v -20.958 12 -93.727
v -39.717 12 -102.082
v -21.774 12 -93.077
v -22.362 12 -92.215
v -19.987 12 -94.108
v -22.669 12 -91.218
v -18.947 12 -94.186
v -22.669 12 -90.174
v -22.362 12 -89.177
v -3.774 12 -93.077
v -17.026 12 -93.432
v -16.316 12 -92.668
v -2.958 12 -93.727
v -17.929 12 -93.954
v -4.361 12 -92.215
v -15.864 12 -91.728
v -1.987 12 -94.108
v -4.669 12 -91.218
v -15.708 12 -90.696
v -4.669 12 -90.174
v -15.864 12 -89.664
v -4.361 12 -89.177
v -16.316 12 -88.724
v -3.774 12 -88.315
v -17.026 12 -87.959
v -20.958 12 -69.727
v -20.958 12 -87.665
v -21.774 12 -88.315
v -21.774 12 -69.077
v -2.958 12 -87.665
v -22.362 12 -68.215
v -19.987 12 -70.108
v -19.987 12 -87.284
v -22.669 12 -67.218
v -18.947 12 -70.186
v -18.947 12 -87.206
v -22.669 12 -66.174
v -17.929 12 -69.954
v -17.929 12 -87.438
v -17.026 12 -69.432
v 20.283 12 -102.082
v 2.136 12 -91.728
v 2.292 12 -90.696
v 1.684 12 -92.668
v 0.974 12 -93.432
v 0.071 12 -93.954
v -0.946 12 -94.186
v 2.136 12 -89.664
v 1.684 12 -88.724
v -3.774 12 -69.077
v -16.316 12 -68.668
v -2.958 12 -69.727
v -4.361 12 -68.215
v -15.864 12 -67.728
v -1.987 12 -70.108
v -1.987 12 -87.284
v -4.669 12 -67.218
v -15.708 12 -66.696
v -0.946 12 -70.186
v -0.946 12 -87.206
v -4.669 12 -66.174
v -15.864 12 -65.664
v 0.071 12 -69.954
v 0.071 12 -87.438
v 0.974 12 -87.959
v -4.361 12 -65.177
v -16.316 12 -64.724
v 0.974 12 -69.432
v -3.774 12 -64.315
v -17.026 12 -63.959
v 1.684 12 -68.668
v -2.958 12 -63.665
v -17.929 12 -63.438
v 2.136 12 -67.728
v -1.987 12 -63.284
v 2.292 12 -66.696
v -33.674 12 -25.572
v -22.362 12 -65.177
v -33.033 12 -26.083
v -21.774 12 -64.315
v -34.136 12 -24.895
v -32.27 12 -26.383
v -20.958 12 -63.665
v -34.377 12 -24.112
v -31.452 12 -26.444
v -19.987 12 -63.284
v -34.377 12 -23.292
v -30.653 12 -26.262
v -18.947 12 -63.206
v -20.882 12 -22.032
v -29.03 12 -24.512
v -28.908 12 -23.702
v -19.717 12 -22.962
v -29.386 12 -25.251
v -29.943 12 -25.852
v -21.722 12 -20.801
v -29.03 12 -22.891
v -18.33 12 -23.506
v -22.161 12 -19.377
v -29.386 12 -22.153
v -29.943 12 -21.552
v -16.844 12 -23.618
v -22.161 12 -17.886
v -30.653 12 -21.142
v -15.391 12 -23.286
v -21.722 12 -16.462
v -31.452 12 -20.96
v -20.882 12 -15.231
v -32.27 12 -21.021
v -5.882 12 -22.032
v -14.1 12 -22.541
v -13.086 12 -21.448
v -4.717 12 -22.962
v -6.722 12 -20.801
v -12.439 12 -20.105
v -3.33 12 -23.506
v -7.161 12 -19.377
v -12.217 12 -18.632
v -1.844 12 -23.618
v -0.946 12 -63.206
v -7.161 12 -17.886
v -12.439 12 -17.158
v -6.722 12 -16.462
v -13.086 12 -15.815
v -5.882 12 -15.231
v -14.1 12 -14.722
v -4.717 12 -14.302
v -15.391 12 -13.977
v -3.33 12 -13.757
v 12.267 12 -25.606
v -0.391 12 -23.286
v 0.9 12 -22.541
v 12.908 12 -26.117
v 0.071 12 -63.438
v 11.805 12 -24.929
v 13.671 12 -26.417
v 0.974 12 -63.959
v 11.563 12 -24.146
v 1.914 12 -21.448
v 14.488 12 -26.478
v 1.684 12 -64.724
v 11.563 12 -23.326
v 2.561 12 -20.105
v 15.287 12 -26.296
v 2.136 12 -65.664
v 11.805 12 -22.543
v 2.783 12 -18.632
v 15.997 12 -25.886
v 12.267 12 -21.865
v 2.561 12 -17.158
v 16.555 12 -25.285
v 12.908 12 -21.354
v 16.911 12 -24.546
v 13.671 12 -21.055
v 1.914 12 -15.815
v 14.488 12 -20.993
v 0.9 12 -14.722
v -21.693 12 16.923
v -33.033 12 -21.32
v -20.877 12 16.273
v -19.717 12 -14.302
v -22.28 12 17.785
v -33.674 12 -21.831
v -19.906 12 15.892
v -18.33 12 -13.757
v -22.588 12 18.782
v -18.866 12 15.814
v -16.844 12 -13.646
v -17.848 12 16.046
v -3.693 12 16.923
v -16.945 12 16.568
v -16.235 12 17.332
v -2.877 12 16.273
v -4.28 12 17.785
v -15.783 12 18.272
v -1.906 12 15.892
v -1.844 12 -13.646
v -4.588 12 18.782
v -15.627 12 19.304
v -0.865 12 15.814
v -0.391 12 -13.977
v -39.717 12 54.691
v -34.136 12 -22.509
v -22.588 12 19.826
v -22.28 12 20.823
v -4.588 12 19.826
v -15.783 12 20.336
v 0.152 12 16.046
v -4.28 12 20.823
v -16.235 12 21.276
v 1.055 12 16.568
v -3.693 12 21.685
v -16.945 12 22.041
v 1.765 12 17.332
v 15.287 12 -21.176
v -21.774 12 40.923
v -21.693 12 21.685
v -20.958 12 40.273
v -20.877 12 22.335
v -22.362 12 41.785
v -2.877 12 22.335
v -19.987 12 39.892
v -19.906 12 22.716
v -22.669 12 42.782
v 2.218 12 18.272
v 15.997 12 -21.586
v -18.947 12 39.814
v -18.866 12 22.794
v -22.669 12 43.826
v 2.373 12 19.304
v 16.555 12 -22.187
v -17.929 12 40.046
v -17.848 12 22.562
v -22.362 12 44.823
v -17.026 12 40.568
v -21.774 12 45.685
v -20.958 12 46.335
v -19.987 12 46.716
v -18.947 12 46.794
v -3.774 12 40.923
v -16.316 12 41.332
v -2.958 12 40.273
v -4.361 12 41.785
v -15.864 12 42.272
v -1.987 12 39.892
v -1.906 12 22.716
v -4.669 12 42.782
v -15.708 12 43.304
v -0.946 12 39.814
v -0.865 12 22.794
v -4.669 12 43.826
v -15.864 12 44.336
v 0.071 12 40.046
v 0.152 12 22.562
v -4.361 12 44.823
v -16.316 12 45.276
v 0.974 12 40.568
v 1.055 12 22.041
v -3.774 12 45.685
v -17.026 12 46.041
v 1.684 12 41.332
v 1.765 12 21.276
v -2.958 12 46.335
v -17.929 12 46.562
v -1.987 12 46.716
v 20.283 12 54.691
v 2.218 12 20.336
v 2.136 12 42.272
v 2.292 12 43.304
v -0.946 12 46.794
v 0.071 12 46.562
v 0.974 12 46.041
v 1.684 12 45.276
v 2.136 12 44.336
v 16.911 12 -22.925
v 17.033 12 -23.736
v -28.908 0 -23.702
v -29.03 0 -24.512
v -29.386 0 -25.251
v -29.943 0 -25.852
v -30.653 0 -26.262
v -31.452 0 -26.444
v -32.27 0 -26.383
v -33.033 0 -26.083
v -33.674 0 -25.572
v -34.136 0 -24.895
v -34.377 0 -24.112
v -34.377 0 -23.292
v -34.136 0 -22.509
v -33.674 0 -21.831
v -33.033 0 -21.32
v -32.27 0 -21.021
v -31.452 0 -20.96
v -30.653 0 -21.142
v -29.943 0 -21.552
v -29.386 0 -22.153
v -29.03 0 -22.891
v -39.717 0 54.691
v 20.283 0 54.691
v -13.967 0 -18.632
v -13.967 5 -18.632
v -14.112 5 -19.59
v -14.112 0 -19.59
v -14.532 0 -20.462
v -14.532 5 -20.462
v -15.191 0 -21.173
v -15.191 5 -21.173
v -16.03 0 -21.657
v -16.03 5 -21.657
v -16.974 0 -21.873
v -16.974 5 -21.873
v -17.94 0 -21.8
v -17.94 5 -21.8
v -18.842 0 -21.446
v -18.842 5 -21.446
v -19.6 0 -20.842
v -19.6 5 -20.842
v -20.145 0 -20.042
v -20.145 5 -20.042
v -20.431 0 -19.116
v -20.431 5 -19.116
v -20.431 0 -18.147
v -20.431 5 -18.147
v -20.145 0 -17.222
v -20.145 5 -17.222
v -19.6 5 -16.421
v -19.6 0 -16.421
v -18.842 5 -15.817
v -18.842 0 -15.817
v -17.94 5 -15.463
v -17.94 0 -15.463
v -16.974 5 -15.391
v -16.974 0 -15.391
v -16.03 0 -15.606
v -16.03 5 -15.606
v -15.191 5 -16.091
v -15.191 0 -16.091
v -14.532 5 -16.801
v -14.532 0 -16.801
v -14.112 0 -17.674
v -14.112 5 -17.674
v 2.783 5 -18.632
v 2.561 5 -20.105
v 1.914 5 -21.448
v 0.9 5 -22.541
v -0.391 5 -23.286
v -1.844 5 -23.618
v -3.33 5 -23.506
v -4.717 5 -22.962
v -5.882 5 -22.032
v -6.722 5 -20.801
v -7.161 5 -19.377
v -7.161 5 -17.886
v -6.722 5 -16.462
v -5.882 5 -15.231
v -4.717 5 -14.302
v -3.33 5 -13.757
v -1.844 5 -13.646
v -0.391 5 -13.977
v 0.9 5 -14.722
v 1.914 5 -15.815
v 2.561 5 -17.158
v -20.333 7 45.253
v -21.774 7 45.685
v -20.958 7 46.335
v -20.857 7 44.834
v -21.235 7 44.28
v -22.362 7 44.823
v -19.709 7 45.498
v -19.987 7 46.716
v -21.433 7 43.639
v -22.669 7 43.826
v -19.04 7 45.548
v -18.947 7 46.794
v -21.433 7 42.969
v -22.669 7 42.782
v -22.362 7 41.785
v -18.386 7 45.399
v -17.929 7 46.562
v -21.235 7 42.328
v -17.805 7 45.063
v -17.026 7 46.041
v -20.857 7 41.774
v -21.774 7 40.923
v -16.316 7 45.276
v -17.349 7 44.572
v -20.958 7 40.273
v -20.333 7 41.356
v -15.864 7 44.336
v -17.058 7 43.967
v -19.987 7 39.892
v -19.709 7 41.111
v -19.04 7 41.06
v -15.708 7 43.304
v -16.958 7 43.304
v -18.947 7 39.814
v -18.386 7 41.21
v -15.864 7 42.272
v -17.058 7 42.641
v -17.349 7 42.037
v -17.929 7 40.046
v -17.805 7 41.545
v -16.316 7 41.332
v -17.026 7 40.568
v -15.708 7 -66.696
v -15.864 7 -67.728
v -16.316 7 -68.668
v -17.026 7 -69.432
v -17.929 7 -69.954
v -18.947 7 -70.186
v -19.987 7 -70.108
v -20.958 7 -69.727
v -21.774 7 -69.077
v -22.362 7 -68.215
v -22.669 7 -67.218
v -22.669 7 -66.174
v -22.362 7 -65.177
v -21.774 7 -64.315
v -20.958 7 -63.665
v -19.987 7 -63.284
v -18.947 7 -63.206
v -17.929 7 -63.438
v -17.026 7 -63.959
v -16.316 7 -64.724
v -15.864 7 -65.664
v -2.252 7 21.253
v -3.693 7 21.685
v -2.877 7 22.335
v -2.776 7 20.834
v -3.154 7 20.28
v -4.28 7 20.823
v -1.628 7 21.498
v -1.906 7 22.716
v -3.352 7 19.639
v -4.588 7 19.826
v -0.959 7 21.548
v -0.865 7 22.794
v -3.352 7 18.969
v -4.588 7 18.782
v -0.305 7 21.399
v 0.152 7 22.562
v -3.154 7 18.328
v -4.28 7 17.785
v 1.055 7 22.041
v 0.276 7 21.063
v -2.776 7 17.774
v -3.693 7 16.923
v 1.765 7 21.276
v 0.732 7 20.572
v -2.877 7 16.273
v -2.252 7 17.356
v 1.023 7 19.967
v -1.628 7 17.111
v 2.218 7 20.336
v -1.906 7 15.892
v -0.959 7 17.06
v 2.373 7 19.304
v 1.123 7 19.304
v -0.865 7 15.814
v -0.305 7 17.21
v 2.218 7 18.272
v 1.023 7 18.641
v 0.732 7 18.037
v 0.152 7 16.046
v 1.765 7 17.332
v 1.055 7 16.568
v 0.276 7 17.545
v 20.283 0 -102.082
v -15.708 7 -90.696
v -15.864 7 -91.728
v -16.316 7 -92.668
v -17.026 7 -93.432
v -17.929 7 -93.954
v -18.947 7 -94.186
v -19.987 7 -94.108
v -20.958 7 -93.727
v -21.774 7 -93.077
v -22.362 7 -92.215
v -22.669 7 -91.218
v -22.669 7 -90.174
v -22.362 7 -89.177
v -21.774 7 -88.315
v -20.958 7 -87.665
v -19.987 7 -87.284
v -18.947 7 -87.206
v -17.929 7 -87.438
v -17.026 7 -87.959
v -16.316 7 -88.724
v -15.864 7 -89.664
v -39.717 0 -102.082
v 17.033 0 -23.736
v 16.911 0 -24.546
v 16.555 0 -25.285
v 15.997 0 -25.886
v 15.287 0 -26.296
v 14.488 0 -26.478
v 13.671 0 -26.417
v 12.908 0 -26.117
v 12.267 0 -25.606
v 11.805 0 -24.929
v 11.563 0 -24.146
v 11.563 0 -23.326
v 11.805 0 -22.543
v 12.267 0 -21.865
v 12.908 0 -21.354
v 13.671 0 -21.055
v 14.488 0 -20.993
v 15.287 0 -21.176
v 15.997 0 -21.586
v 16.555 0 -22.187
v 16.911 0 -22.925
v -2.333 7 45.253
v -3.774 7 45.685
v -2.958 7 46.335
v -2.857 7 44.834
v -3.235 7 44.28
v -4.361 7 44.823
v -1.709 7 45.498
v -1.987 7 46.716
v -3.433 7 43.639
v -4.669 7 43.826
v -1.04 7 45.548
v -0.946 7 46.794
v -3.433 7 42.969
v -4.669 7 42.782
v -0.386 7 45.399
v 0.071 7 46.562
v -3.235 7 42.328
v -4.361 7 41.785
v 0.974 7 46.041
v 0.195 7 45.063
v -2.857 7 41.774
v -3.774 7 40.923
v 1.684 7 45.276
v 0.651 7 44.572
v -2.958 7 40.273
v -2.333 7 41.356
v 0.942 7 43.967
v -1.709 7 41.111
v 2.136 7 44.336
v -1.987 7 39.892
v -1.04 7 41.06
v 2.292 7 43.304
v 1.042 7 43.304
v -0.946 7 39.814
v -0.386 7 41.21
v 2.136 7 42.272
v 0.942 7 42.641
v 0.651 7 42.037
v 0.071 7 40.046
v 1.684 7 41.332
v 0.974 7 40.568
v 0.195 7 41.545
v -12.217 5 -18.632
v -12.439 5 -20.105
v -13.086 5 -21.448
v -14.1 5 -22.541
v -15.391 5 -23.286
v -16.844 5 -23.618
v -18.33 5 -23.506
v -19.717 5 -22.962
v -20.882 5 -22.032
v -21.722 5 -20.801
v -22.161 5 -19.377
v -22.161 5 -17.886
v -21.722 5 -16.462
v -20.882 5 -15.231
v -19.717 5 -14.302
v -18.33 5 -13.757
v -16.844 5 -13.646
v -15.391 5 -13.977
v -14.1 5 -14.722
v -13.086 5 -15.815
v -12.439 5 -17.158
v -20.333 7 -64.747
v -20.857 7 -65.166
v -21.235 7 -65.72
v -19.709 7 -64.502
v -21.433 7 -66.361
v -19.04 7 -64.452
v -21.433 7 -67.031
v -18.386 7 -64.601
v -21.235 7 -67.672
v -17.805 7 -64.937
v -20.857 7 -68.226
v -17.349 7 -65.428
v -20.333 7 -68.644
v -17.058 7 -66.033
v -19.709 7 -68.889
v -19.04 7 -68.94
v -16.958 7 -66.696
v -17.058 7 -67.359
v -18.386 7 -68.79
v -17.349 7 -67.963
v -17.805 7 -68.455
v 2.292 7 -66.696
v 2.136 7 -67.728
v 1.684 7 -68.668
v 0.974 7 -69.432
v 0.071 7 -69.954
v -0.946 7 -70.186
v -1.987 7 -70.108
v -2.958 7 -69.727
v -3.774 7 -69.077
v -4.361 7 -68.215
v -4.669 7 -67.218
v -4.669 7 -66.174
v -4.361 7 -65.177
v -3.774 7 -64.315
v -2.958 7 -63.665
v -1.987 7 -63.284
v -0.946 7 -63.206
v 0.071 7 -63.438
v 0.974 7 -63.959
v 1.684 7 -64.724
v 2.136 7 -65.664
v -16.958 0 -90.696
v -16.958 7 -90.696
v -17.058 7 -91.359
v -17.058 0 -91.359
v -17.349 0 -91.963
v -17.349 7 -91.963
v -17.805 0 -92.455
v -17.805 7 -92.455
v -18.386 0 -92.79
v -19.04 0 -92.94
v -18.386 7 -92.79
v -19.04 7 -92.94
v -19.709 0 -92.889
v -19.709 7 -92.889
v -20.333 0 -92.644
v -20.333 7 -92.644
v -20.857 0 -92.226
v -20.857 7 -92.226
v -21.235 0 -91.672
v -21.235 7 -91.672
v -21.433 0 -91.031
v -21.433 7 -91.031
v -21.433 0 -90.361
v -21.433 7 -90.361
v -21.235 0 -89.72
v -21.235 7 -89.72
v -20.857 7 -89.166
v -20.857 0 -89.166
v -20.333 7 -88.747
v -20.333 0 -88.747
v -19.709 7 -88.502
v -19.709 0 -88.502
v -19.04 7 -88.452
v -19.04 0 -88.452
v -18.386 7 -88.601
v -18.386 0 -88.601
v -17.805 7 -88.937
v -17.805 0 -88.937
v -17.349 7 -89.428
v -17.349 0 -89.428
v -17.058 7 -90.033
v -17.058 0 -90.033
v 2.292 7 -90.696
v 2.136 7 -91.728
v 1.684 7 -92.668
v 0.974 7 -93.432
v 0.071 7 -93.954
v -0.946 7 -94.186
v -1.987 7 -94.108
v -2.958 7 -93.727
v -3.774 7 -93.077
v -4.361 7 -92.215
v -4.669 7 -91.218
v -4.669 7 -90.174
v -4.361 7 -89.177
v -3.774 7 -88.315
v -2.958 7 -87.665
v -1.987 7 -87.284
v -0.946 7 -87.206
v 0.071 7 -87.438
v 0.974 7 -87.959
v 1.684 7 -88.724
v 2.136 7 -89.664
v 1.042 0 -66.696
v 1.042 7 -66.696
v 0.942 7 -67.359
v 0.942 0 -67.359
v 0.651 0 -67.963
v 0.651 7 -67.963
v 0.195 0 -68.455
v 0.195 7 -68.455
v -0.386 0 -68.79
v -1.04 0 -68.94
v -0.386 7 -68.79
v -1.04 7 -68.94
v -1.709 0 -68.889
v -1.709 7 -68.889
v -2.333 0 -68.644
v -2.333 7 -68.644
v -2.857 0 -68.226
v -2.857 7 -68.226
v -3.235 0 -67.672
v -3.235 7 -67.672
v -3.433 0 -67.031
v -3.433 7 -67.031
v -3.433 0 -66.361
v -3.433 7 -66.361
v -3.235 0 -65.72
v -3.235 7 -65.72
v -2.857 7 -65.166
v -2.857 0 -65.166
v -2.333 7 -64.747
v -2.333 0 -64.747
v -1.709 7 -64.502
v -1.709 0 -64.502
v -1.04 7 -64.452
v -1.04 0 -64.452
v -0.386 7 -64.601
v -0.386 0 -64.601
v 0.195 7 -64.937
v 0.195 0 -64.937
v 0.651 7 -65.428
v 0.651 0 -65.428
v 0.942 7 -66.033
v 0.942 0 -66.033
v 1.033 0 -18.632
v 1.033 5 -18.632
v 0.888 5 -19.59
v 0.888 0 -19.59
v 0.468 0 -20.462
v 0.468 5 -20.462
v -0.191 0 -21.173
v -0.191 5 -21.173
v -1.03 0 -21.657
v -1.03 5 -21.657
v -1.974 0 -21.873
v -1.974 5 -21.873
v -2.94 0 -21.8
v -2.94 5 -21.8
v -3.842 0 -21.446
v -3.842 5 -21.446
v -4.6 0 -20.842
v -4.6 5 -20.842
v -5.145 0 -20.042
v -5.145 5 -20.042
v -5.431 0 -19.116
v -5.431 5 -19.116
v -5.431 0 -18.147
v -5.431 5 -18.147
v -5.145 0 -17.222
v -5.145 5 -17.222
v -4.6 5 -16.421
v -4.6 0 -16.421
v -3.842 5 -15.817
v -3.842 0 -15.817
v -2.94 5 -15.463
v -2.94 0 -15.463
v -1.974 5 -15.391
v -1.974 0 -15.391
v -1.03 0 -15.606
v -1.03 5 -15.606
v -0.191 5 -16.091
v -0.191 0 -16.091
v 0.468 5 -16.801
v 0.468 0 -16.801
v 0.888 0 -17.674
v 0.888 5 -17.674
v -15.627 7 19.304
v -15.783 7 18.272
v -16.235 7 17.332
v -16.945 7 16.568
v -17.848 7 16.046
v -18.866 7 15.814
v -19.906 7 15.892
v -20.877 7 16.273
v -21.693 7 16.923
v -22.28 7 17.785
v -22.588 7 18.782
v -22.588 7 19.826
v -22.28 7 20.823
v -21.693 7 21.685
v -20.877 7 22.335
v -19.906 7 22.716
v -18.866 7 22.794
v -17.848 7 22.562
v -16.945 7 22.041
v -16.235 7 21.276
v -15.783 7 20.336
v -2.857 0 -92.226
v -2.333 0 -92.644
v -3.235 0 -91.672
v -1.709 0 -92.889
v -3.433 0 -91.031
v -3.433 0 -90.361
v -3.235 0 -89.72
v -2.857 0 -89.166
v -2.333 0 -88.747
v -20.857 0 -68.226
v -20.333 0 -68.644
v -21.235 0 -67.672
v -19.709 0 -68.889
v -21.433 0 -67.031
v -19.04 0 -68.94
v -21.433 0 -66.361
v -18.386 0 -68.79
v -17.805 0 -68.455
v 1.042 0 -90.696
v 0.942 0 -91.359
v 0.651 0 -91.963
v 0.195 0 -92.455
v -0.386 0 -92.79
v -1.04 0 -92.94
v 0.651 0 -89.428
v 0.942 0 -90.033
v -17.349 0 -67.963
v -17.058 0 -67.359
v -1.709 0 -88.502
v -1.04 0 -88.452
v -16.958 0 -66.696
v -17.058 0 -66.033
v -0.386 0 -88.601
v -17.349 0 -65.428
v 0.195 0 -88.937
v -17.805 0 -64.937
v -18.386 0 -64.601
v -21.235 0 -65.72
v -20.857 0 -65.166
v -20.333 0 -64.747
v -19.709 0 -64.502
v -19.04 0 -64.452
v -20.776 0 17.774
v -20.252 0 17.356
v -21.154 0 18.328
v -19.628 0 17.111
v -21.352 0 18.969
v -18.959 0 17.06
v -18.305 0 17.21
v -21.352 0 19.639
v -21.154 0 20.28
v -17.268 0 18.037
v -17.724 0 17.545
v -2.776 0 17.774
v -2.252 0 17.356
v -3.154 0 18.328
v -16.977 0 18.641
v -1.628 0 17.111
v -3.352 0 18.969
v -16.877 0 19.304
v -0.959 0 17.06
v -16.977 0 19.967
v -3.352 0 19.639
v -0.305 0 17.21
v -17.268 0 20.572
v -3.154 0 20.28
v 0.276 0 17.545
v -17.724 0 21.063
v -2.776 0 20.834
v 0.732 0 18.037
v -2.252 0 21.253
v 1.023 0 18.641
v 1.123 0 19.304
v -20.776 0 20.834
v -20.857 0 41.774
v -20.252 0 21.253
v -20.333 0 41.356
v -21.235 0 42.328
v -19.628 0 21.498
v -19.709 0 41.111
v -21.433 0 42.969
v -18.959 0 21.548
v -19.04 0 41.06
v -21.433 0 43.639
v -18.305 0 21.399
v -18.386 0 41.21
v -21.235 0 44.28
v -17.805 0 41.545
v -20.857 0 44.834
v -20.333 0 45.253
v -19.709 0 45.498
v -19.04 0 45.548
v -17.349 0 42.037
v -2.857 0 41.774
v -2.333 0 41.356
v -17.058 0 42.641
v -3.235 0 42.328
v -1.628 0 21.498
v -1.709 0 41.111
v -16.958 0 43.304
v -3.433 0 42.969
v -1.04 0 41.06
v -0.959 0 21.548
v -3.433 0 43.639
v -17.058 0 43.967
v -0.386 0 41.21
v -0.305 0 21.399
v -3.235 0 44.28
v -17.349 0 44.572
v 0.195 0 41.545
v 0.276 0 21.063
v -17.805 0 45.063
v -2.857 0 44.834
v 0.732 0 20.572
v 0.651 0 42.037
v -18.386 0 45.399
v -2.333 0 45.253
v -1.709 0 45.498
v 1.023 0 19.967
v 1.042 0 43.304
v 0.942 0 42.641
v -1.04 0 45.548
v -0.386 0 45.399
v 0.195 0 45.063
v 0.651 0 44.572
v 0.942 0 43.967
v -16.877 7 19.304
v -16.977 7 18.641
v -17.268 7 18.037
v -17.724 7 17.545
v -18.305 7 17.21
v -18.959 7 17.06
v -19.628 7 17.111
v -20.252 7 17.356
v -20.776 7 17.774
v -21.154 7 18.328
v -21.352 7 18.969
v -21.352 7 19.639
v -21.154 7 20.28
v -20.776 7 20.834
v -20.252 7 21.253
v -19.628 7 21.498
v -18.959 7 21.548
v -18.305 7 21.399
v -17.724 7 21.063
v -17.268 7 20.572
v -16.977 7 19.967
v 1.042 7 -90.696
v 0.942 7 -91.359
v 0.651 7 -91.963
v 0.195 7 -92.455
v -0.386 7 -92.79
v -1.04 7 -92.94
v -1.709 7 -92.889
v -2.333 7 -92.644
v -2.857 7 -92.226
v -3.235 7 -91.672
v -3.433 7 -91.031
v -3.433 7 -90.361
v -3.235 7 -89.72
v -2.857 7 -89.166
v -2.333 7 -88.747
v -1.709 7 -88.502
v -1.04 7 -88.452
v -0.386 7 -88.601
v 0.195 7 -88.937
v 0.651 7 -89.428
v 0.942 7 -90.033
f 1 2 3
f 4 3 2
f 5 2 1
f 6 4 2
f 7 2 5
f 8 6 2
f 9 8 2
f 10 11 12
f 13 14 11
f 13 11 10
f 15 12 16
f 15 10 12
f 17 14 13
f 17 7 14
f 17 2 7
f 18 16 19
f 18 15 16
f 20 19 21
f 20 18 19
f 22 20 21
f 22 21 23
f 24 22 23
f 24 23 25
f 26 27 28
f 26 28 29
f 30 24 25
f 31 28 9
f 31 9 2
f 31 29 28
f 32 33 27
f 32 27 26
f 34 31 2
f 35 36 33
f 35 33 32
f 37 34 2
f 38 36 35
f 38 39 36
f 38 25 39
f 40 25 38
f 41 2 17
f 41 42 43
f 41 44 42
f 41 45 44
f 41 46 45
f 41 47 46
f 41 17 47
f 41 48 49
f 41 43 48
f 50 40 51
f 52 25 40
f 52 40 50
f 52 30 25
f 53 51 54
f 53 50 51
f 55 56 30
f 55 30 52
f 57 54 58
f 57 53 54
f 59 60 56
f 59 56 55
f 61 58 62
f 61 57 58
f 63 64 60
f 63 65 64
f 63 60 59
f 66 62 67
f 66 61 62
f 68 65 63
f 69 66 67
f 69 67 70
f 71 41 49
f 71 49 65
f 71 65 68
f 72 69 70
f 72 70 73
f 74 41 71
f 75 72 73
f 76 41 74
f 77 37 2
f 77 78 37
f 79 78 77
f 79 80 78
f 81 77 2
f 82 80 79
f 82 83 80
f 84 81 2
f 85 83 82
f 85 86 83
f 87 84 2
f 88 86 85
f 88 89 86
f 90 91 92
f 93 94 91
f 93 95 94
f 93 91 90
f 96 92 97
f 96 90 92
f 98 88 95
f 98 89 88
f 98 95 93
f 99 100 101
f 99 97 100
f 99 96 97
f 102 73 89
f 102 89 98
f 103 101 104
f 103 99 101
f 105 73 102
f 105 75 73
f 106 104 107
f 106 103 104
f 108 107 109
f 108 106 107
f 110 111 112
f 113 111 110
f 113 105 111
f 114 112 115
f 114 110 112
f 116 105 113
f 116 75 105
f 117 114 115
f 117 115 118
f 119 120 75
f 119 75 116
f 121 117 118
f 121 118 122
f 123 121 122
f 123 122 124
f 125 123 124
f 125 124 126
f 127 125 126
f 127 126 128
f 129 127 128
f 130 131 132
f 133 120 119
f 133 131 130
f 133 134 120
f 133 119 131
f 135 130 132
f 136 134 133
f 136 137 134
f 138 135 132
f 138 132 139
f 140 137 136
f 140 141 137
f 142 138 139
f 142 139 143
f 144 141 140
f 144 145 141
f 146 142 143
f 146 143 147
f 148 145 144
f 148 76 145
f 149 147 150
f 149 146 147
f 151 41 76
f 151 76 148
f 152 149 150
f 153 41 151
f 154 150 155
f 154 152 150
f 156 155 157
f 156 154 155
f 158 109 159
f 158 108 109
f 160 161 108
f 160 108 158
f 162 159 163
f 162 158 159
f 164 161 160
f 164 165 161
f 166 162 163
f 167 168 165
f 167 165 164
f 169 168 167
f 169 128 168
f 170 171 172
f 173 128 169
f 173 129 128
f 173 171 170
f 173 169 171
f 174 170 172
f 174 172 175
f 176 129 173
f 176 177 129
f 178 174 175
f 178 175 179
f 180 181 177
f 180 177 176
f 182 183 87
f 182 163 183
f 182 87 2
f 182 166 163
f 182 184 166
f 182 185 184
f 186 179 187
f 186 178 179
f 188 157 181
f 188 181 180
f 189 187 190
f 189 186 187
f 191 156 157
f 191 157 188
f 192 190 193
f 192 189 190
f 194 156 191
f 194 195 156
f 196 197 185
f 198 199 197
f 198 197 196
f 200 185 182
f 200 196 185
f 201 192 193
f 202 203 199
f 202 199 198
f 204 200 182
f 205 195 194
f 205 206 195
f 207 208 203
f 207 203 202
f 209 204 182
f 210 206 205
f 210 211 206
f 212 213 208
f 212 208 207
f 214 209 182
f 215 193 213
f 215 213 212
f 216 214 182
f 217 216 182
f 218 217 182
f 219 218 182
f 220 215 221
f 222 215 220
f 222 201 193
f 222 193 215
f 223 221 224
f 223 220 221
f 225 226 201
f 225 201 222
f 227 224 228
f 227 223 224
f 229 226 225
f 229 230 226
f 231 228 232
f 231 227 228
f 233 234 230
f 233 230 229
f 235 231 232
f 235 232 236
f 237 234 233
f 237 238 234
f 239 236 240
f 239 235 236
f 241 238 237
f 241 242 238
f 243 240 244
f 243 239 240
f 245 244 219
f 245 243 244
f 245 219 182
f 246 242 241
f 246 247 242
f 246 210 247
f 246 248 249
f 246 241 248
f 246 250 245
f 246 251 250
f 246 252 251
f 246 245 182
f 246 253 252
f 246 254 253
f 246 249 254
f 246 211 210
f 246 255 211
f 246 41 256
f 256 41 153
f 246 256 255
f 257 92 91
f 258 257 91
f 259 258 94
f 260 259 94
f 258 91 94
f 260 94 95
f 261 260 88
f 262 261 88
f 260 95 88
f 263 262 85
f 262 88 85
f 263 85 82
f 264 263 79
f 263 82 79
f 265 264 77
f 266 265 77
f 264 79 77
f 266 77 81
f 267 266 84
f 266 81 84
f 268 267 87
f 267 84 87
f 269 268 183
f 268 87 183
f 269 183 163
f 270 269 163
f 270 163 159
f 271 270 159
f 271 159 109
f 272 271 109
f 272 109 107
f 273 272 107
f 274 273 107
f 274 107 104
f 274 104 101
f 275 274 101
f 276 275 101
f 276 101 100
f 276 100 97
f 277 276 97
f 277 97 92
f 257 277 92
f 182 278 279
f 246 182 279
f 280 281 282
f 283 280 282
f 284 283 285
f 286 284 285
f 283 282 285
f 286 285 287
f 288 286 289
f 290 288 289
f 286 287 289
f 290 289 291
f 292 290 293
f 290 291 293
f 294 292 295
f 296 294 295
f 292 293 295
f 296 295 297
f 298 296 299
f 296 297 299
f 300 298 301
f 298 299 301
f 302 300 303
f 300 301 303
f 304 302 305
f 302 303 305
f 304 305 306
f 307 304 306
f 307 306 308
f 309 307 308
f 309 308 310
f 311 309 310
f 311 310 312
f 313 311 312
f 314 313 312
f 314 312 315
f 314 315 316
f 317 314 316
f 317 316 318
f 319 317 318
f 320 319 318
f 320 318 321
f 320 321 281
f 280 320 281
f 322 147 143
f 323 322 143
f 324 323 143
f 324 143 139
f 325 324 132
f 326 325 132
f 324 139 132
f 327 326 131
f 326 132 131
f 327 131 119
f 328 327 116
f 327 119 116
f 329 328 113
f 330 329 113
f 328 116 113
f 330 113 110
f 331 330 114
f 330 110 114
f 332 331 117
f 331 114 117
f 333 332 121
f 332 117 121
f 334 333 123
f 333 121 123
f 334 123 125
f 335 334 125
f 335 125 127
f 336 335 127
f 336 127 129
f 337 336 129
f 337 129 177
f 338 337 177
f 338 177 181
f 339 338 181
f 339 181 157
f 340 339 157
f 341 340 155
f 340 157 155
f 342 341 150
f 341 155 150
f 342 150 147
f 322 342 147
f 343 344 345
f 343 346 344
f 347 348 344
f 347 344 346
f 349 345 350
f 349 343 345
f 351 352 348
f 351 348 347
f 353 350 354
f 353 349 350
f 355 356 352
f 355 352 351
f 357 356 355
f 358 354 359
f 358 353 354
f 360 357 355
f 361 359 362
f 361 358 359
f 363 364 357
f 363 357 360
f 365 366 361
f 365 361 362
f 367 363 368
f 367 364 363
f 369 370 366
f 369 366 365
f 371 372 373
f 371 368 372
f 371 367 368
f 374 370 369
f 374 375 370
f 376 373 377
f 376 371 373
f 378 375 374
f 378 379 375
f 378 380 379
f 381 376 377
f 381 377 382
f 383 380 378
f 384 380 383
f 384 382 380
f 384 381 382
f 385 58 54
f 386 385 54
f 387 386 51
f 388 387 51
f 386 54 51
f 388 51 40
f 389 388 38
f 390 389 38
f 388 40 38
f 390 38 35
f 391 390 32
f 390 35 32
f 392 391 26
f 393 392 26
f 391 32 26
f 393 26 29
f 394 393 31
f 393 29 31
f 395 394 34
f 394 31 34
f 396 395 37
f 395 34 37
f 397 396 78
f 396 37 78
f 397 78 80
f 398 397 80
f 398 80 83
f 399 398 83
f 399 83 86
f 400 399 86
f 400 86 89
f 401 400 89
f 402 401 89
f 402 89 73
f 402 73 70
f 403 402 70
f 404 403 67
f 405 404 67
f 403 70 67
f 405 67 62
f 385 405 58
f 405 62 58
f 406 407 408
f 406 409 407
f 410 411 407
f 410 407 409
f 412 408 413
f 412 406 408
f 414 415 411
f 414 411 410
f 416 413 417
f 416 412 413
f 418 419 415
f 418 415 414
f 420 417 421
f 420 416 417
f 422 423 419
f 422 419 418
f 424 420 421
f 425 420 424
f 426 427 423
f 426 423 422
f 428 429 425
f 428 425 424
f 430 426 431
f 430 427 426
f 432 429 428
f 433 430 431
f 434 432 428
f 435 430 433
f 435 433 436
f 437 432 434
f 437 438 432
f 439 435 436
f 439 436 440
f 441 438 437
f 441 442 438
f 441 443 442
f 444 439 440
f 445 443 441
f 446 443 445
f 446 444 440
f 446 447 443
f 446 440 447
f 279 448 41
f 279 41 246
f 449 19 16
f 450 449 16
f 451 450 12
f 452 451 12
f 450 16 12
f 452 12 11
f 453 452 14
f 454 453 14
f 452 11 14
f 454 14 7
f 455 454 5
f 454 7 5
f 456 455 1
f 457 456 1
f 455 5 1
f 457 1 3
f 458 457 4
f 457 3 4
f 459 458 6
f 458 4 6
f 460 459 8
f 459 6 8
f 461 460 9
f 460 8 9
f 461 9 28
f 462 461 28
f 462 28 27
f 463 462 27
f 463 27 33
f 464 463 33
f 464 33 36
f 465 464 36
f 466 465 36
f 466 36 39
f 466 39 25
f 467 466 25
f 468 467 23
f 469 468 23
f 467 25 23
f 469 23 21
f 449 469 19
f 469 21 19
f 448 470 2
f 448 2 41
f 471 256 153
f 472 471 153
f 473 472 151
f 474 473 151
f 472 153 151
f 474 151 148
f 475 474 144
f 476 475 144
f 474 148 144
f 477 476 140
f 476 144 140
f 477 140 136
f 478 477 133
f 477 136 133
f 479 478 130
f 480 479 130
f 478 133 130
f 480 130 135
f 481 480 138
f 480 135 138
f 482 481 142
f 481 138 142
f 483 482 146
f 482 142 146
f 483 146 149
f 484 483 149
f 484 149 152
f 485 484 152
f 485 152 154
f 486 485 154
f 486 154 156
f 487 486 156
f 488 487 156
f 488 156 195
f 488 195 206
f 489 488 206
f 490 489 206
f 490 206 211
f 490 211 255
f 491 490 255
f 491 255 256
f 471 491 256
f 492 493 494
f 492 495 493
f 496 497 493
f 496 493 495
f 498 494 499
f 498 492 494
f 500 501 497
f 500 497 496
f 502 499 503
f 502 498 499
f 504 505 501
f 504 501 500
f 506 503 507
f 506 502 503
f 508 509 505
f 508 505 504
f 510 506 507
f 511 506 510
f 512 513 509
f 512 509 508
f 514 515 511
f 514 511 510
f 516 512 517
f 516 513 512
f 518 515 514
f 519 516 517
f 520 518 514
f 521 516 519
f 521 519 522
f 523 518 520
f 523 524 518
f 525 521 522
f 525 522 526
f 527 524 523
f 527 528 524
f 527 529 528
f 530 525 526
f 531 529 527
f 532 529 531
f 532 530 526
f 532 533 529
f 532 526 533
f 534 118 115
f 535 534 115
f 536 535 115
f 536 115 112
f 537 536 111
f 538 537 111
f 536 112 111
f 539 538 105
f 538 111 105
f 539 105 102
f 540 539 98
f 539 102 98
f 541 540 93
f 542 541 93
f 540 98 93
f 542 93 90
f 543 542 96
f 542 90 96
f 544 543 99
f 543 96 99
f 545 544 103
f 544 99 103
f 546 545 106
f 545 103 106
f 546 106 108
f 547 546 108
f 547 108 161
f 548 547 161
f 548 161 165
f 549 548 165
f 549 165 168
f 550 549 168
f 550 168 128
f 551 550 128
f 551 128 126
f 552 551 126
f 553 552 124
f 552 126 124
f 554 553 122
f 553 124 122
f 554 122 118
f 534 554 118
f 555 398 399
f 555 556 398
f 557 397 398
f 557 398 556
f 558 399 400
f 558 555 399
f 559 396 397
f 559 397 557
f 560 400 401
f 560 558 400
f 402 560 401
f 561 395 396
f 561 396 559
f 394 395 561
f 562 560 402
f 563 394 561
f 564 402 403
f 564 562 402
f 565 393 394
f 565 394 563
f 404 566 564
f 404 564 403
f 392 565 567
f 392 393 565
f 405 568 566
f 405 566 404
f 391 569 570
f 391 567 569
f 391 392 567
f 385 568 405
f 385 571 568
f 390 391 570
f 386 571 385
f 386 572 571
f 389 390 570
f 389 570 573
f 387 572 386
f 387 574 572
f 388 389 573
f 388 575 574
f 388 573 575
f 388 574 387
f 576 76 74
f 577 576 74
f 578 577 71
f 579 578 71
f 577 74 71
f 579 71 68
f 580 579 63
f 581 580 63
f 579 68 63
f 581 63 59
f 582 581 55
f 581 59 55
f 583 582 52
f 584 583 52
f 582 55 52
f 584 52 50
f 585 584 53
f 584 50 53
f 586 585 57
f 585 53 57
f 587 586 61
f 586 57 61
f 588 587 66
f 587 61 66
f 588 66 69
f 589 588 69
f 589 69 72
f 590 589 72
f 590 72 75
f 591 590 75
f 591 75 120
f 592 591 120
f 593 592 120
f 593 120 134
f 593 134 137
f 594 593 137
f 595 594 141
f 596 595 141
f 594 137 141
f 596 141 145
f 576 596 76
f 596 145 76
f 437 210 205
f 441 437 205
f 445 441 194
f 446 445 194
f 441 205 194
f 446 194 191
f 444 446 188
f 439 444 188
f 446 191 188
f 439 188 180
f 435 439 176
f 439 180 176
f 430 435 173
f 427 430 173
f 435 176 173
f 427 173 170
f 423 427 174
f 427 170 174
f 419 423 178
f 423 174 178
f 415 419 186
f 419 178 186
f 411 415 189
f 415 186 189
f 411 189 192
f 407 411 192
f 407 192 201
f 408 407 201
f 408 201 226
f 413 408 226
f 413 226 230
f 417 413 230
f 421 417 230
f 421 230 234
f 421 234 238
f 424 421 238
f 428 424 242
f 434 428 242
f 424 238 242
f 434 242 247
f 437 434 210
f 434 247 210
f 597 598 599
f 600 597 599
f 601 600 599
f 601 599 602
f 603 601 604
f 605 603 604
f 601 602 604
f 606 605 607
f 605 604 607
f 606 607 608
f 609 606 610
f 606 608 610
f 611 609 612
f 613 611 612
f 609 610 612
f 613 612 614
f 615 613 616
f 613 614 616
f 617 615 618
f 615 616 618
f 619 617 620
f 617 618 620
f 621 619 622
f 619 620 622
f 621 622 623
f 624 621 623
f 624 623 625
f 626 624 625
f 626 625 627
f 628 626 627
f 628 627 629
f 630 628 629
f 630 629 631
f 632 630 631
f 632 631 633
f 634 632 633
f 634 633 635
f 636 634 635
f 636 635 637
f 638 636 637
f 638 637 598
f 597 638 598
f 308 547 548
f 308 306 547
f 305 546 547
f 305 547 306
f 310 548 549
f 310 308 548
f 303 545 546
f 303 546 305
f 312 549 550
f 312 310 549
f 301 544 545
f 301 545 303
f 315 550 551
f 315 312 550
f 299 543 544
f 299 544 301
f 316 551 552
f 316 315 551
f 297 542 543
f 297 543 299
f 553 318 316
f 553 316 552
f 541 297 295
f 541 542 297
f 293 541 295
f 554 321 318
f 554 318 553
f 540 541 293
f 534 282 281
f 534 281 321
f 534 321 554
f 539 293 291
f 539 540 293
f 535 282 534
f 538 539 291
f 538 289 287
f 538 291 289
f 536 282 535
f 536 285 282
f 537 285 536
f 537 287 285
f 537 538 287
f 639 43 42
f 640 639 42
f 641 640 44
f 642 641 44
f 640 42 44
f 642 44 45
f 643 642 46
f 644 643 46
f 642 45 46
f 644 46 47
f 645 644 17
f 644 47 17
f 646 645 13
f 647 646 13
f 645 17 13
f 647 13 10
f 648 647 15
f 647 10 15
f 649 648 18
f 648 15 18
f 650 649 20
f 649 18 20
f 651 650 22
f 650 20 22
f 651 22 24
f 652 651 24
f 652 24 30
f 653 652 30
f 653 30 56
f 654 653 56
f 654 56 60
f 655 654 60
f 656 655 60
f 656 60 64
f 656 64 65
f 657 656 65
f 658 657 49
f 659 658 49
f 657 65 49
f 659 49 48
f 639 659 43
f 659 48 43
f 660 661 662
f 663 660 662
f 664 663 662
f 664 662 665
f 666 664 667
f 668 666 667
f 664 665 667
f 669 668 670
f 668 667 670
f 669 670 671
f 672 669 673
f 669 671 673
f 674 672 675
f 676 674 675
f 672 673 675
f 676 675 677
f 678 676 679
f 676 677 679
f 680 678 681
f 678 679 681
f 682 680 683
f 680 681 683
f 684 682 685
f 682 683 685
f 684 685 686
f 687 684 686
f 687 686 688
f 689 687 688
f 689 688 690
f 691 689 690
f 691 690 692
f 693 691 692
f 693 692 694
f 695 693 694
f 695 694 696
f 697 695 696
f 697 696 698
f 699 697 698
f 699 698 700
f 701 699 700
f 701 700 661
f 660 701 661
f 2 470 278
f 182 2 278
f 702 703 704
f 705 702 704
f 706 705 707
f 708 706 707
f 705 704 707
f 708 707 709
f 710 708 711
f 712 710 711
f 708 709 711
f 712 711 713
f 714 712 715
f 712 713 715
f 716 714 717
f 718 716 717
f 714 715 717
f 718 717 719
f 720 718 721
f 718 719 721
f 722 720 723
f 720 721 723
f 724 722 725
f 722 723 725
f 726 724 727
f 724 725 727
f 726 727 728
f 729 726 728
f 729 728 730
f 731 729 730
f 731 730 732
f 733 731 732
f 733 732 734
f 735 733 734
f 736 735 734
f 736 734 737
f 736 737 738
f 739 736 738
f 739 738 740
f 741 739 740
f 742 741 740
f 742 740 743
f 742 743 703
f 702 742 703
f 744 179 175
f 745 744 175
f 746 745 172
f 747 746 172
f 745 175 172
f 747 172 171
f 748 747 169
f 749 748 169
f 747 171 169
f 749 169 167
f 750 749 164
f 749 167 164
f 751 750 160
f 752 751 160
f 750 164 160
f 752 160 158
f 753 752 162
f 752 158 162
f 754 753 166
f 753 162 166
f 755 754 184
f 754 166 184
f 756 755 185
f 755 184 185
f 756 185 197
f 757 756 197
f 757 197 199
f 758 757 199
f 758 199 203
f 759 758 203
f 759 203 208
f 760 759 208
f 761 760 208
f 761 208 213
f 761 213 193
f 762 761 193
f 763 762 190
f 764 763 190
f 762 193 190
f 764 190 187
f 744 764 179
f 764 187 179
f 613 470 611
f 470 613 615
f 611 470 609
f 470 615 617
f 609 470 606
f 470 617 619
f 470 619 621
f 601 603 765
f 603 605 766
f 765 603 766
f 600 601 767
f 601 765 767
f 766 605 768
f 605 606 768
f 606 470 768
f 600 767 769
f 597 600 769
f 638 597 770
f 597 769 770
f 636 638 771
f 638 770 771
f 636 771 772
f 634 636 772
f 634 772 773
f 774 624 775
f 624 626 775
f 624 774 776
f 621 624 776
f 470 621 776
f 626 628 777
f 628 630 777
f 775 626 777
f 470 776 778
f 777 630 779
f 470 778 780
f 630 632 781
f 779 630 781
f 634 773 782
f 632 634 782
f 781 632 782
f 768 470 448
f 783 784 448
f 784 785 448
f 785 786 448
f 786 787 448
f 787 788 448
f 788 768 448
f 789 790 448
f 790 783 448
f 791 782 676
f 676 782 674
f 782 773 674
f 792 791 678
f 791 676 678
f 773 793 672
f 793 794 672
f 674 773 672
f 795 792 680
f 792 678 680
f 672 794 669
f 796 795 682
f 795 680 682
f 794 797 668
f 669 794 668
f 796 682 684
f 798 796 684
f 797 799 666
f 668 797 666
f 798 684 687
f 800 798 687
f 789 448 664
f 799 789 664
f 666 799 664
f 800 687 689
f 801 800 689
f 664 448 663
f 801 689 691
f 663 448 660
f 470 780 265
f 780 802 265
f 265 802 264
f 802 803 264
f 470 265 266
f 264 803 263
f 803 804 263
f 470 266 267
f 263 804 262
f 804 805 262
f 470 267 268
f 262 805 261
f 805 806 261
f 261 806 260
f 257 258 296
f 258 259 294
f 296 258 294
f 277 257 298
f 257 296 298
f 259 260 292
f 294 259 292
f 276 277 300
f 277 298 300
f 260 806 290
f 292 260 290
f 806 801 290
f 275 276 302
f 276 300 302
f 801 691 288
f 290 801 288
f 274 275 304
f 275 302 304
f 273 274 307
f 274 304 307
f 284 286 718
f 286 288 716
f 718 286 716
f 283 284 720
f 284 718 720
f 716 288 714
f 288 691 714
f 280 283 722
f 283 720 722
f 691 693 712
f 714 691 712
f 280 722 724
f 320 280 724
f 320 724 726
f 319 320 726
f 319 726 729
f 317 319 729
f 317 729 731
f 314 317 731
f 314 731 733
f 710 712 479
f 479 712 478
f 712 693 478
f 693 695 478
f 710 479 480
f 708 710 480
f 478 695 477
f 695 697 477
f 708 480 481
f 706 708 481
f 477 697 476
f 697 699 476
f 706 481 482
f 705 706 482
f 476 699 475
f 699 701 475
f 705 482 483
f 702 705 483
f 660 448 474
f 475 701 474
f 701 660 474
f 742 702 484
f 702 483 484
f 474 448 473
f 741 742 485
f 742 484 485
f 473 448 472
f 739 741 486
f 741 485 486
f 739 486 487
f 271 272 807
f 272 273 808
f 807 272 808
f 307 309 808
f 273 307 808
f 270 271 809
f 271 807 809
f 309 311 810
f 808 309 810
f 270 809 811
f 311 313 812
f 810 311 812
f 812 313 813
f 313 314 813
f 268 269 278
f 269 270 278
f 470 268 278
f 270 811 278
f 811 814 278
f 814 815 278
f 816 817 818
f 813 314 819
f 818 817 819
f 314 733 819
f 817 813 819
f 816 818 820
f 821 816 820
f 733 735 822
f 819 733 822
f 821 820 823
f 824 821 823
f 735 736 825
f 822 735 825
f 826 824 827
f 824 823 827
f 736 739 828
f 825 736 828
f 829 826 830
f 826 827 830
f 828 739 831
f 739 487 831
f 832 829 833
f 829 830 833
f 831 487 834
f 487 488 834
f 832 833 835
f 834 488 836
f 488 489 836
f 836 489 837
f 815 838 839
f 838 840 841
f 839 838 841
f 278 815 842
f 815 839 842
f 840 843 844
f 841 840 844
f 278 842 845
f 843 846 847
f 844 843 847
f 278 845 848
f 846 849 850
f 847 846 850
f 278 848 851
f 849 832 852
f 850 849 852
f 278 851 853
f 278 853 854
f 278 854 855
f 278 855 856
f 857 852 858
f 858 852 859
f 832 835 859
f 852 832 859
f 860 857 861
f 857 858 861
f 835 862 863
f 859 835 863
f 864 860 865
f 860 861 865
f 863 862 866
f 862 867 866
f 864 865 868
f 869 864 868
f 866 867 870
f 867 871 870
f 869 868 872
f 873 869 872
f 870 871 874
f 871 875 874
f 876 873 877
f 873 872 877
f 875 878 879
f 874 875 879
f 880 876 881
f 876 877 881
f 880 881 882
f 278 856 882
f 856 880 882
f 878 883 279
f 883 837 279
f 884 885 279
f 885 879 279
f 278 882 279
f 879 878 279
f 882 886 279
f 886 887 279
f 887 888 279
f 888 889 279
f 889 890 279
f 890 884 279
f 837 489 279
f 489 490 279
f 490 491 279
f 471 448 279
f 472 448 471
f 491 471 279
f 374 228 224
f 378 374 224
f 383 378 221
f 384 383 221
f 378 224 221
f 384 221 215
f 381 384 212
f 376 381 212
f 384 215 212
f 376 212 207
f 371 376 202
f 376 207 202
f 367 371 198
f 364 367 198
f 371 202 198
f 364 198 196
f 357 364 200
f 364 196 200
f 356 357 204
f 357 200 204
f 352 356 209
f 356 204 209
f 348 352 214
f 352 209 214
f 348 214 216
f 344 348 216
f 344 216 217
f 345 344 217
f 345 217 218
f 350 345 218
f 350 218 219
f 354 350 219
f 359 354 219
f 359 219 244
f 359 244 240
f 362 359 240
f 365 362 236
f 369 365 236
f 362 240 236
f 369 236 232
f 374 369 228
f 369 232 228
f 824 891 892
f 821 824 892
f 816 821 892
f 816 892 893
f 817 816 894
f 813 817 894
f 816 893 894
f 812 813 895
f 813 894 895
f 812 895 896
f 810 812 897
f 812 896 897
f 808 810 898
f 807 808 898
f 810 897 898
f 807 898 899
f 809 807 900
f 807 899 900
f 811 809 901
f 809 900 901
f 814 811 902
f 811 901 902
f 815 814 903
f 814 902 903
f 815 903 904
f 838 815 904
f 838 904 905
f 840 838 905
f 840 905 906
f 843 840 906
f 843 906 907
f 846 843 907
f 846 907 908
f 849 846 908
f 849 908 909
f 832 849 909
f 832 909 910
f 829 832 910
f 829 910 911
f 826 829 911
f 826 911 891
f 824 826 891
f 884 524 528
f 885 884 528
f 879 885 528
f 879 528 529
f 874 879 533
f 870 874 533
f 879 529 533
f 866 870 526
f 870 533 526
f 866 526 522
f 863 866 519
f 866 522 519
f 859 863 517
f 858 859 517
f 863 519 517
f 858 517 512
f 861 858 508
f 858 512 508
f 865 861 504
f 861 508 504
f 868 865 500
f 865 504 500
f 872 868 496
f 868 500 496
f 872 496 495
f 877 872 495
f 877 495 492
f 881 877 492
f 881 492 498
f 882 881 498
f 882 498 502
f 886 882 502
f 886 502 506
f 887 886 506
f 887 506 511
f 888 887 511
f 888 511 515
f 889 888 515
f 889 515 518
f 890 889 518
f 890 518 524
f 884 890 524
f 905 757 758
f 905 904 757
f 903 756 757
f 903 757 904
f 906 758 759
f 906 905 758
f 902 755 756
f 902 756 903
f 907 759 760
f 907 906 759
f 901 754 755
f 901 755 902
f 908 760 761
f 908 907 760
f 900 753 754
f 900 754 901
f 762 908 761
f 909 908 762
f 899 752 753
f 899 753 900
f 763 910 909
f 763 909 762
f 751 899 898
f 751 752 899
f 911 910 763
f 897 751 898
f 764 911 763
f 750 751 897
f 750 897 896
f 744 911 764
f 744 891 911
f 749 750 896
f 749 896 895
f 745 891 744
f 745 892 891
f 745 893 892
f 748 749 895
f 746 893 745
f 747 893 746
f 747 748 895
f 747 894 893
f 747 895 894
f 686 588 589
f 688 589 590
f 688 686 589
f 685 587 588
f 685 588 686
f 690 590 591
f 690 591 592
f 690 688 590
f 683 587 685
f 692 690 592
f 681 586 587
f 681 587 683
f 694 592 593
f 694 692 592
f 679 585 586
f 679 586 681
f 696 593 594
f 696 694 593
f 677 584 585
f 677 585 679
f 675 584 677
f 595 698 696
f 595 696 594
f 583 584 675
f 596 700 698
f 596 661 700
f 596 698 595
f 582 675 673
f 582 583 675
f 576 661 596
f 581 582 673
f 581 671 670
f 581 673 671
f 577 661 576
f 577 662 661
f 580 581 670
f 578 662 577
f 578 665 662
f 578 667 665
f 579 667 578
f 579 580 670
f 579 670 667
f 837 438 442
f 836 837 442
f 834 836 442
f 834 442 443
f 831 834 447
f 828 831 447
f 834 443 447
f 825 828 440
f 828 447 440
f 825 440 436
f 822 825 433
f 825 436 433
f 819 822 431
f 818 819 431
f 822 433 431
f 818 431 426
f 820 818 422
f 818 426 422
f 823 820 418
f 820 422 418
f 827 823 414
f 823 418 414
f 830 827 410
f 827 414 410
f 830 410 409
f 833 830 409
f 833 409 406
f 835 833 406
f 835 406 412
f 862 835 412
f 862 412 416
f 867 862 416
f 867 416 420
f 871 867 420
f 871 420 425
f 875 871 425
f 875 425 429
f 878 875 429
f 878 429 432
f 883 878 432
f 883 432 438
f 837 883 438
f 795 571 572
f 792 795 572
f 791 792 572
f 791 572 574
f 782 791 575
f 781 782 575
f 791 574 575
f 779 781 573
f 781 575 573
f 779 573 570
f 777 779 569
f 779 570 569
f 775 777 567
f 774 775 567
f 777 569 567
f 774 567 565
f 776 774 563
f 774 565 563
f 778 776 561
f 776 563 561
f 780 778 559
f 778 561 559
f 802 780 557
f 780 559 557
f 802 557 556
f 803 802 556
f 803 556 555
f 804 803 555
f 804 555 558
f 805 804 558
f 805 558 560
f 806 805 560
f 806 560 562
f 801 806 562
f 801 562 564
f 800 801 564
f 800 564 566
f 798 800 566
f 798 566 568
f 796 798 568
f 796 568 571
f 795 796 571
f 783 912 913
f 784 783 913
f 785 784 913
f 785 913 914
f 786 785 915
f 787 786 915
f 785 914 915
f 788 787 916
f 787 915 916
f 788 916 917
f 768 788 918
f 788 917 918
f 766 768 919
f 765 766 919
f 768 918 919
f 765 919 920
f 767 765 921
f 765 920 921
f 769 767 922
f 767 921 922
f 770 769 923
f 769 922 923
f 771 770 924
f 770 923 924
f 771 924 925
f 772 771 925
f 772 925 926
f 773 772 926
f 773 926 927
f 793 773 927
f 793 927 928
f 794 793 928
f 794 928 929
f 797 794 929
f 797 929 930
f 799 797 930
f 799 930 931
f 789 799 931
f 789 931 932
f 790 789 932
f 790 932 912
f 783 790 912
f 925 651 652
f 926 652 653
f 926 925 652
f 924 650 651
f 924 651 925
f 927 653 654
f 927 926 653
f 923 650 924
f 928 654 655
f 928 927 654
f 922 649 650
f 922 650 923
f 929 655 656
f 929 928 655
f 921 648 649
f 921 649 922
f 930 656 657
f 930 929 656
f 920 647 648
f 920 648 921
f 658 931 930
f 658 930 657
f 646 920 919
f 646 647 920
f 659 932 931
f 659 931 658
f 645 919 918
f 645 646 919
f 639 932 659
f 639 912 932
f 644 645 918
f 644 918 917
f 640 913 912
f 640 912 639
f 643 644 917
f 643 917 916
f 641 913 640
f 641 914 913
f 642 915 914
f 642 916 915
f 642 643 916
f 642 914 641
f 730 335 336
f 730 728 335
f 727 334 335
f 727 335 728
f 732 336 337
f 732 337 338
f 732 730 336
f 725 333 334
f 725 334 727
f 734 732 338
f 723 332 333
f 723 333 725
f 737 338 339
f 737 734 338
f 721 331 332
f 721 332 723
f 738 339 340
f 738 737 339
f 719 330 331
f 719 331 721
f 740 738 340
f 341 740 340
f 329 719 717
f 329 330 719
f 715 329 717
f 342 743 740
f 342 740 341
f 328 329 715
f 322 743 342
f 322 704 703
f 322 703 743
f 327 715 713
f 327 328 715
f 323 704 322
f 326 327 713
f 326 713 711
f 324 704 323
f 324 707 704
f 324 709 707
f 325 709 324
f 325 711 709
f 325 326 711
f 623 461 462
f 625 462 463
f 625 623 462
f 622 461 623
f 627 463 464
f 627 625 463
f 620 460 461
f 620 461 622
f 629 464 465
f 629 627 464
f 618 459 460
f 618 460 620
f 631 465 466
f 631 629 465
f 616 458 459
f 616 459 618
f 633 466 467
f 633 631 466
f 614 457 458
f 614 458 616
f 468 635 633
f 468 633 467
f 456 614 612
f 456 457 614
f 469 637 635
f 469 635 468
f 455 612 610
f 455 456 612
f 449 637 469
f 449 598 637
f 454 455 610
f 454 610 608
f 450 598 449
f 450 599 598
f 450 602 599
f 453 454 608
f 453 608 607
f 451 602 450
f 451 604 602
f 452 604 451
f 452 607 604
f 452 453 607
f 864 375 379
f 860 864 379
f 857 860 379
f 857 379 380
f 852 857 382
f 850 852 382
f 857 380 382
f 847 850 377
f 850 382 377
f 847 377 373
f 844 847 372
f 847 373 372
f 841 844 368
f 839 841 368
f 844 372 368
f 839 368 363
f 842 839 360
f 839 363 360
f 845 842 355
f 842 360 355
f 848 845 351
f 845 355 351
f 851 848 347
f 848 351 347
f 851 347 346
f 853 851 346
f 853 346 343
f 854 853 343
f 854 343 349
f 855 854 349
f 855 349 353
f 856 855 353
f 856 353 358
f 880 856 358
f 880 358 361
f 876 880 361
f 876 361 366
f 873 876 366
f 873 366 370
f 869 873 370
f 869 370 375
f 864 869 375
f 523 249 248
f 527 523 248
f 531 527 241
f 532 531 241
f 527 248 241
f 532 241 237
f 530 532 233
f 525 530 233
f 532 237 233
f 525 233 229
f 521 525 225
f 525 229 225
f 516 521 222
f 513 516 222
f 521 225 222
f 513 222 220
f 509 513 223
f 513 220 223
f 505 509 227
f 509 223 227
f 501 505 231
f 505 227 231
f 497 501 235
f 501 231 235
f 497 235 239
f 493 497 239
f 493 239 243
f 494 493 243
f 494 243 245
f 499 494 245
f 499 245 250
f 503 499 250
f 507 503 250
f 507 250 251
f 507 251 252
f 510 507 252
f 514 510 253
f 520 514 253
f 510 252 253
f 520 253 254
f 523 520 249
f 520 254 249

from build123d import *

# Parameters (mm, degrees)
SKETCH3_W           = 156.772980402
SKETCH3_H           = 60
BOSS_EXTRUDE6_DEPTH = 12
CUT_EXTRUDE1_REACH  = 14
SKETCH4_R           = 2.25
CUT_EXTRUDE2_REACH  = 14
SKETCH6_R           = 3.25
SKETCH7_R           = 3.5
CUT_EXTRUDE3_DEPTH  = 5
SKETCH8_R           = 5
CUT_EXTRUDE4_DEPTH  = 7
CUT_EXTRUDE5_REACH  = 14
SKETCH9_R           = 2.75


with BuildPart() as part:
    # Sketch3 → Boss-Extrude6 (new body)
    with BuildSketch(Plane(origin=(-27.52701042, 0, 0), x_dir=(0, 0, 1), z_dir=(0, 1, 0))):
        with Locations((-23.695908121, 17.809773729)):
            Rectangle(SKETCH3_W, SKETCH3_H)
    extrude(amount=BOSS_EXTRUDE6_DEPTH)

    # Sketch4 → Cut-Extrude1 (cut, up to next)
    with BuildSketch(Plane(origin=(0, 12, 0), x_dir=(1, 0, 0), z_dir=(0, 1, 0)), mode=Mode.PRIVATE) as cut_extrude1_sk1:
        with Locations((-1.126993796, -19.304091879)):
            Circle(SKETCH4_R)
    cut_extrude1_tool1 = extrude(cut_extrude1_sk1.sketch, amount=-CUT_EXTRUDE1_REACH, mode=Mode.PRIVATE) & part.part
    add(cut_extrude1_tool1.solids().sort_by_distance((-1.126994, 12, 19.304092))[0], mode=Mode.SUBTRACT)
    # Sketch4 → Cut-Extrude1 (cut, up to next)
    with BuildSketch(Plane(origin=(0, 12, 0), x_dir=(1, 0, 0), z_dir=(0, 1, 0)), mode=Mode.PRIVATE) as cut_extrude1_sk2:
        with Locations((-19.127096376, -19.304091879)):
            Circle(SKETCH4_R)
    cut_extrude1_tool2 = extrude(cut_extrude1_sk2.sketch, amount=-CUT_EXTRUDE1_REACH, mode=Mode.PRIVATE) & part.part
    add(cut_extrude1_tool2.solids().sort_by_distance((-19.127096, 12, 19.304092))[0], mode=Mode.SUBTRACT)
    # Sketch4 → Cut-Extrude1 (cut, up to next)
    with BuildSketch(Plane(origin=(0, 12, 0), x_dir=(1, 0, 0), z_dir=(0, 1, 0)), mode=Mode.PRIVATE) as cut_extrude1_sk3:
        with Locations((-1.2080193, -43.304091879)):
            Circle(SKETCH4_R)
    cut_extrude1_tool3 = extrude(cut_extrude1_sk3.sketch, amount=-CUT_EXTRUDE1_REACH, mode=Mode.PRIVATE) & part.part
    add(cut_extrude1_tool3.solids().sort_by_distance((-1.208019, 12, 43.304092))[0], mode=Mode.SUBTRACT)
    # Sketch4 → Cut-Extrude1 (cut, up to next)
    with BuildSketch(Plane(origin=(0, 12, 0), x_dir=(1, 0, 0), z_dir=(0, 1, 0)), mode=Mode.PRIVATE) as cut_extrude1_sk4:
        with Locations((-19.208121879, -43.304091879)):
            Circle(SKETCH4_R)
    cut_extrude1_tool4 = extrude(cut_extrude1_sk4.sketch, amount=-CUT_EXTRUDE1_REACH, mode=Mode.PRIVATE) & part.part
    add(cut_extrude1_tool4.solids().sort_by_distance((-19.208122, 12, 43.304092))[0], mode=Mode.SUBTRACT)
    # Sketch4 → Cut-Extrude1 (cut, up to next)
    with BuildSketch(Plane(origin=(0, 12, 0), x_dir=(1, 0, 0), z_dir=(0, 1, 0)), mode=Mode.PRIVATE) as cut_extrude1_sk5:
        with Locations((-19.208121879, 66.695908121)):
            Circle(SKETCH4_R)
    cut_extrude1_tool5 = extrude(cut_extrude1_sk5.sketch, amount=-CUT_EXTRUDE1_REACH, mode=Mode.PRIVATE) & part.part
    add(cut_extrude1_tool5.solids().sort_by_distance((-19.208122, 12, -66.695908))[0], mode=Mode.SUBTRACT)
    # Sketch4 → Cut-Extrude1 (cut, up to next)
    with BuildSketch(Plane(origin=(0, 12, 0), x_dir=(1, 0, 0), z_dir=(0, 1, 0)), mode=Mode.PRIVATE) as cut_extrude1_sk6:
        with Locations((-19.208121879, 90.695908121)):
            Circle(SKETCH4_R)
    cut_extrude1_tool6 = extrude(cut_extrude1_sk6.sketch, amount=-CUT_EXTRUDE1_REACH, mode=Mode.PRIVATE) & part.part
    add(cut_extrude1_tool6.solids().sort_by_distance((-19.208122, 12, -90.695908))[0], mode=Mode.SUBTRACT)
    # Sketch4 → Cut-Extrude1 (cut, up to next)
    with BuildSketch(Plane(origin=(0, 12, 0), x_dir=(1, 0, 0), z_dir=(0, 1, 0)), mode=Mode.PRIVATE) as cut_extrude1_sk7:
        with Locations((-1.2080193, 90.695908121)):
            Circle(SKETCH4_R)
    cut_extrude1_tool7 = extrude(cut_extrude1_sk7.sketch, amount=-CUT_EXTRUDE1_REACH, mode=Mode.PRIVATE) & part.part
    add(cut_extrude1_tool7.solids().sort_by_distance((-1.208019, 12, -90.695908))[0], mode=Mode.SUBTRACT)
    # Sketch4 → Cut-Extrude1 (cut, up to next)
    with BuildSketch(Plane(origin=(0, 12, 0), x_dir=(1, 0, 0), z_dir=(0, 1, 0)), mode=Mode.PRIVATE) as cut_extrude1_sk8:
        with Locations((-1.2080193, 66.695908121)):
            Circle(SKETCH4_R)
    cut_extrude1_tool8 = extrude(cut_extrude1_sk8.sketch, amount=-CUT_EXTRUDE1_REACH, mode=Mode.PRIVATE) & part.part
    add(cut_extrude1_tool8.solids().sort_by_distance((-1.208019, 12, -66.695908))[0], mode=Mode.SUBTRACT)

    # Sketch6 → Cut-Extrude2 (cut, up to next)
    with BuildSketch(Plane(origin=(0, 12, 0), x_dir=(1, 0, 0), z_dir=(0, 1, 0)), mode=Mode.PRIVATE) as cut_extrude2_sk1:
        with Locations((-17.217236691, 18.631632081)):
            Circle(SKETCH6_R)
    cut_extrude2_tool1 = extrude(cut_extrude2_sk1.sketch, amount=-CUT_EXTRUDE2_REACH, mode=Mode.PRIVATE) & part.part
    add(cut_extrude2_tool1.solids().sort_by_distance((-17.217237, 12, -18.631632))[0], mode=Mode.SUBTRACT)
    # Sketch6 → Cut-Extrude2 (cut, up to next)
    with BuildSketch(Plane(origin=(0, 12, 0), x_dir=(1, 0, 0), z_dir=(0, 1, 0)), mode=Mode.PRIVATE) as cut_extrude2_sk2:
        with Locations((-2.217236691, 18.631632081)):
            Circle(SKETCH6_R)
    cut_extrude2_tool2 = extrude(cut_extrude2_sk2.sketch, amount=-CUT_EXTRUDE2_REACH, mode=Mode.PRIVATE) & part.part
    add(cut_extrude2_tool2.solids().sort_by_distance((-2.217237, 12, -18.631632))[0], mode=Mode.SUBTRACT)

    # Sketch7 → Cut-Extrude3 (cut)
    with BuildSketch(Plane(origin=(0, 12, 0), x_dir=(1, 0, 0), z_dir=(0, 1, 0))):
        with Locations((-19.127096376, -19.304091879)):
            Circle(SKETCH7_R)
        with Locations((-19.208121879, -43.304091879)):
            Circle(SKETCH7_R)
        with Locations((-1.2080193, -43.304091879)):
            Circle(SKETCH7_R)
        with Locations((-1.126993796, -19.304091879)):
            Circle(SKETCH7_R)
        with Locations((-1.2080193, 66.695908121)):
            Circle(SKETCH7_R)
        with Locations((-19.208121879, 66.695908121)):
            Circle(SKETCH7_R)
        with Locations((-19.208121879, 90.695908121)):
            Circle(SKETCH7_R)
        with Locations((-1.2080193, 90.695908121)):
            Circle(SKETCH7_R)
    extrude(amount=-CUT_EXTRUDE3_DEPTH, mode=Mode.SUBTRACT)

    # Sketch8 → Cut-Extrude4 (cut)
    with BuildSketch(Plane(origin=(0, 12, 0), x_dir=(1, 0, 0), z_dir=(0, 1, 0))):
        with Locations((-17.217236691, 18.631632081)):
            Circle(SKETCH8_R)
        with Locations((-2.217236691, 18.631632081)):
            Circle(SKETCH8_R)
    extrude(amount=-CUT_EXTRUDE4_DEPTH, mode=Mode.SUBTRACT)

    # Sketch9 → Cut-Extrude5 (cut, up to next)
    with BuildSketch(Plane(origin=(0, 12, 0), x_dir=(1, 0, 0), z_dir=(0, 1, 0)), mode=Mode.PRIVATE) as cut_extrude5_sk1:
        with Locations((-31.657880115, 23.701844607)):
            Circle(SKETCH9_R)
    cut_extrude5_tool1 = extrude(cut_extrude5_sk1.sketch, amount=-CUT_EXTRUDE5_REACH, mode=Mode.PRIVATE) & part.part
    add(cut_extrude5_tool1.solids().sort_by_distance((-31.65788, 12, -23.701845))[0], mode=Mode.SUBTRACT)
    # Sketch9 → Cut-Extrude5 (cut, up to next)
    with BuildSketch(Plane(origin=(0, 12, 0), x_dir=(1, 0, 0), z_dir=(0, 1, 0)), mode=Mode.PRIVATE) as cut_extrude5_sk2:
        with Locations((14.282732382, 23.735684254)):
            Circle(SKETCH9_R)
    cut_extrude5_tool2 = extrude(cut_extrude5_sk2.sketch, amount=-CUT_EXTRUDE5_REACH, mode=Mode.PRIVATE) & part.part
    add(cut_extrude5_tool2.solids().sort_by_distance((14.282732, 12, -23.735684))[0], mode=Mode.SUBTRACT)


solid = part.part
